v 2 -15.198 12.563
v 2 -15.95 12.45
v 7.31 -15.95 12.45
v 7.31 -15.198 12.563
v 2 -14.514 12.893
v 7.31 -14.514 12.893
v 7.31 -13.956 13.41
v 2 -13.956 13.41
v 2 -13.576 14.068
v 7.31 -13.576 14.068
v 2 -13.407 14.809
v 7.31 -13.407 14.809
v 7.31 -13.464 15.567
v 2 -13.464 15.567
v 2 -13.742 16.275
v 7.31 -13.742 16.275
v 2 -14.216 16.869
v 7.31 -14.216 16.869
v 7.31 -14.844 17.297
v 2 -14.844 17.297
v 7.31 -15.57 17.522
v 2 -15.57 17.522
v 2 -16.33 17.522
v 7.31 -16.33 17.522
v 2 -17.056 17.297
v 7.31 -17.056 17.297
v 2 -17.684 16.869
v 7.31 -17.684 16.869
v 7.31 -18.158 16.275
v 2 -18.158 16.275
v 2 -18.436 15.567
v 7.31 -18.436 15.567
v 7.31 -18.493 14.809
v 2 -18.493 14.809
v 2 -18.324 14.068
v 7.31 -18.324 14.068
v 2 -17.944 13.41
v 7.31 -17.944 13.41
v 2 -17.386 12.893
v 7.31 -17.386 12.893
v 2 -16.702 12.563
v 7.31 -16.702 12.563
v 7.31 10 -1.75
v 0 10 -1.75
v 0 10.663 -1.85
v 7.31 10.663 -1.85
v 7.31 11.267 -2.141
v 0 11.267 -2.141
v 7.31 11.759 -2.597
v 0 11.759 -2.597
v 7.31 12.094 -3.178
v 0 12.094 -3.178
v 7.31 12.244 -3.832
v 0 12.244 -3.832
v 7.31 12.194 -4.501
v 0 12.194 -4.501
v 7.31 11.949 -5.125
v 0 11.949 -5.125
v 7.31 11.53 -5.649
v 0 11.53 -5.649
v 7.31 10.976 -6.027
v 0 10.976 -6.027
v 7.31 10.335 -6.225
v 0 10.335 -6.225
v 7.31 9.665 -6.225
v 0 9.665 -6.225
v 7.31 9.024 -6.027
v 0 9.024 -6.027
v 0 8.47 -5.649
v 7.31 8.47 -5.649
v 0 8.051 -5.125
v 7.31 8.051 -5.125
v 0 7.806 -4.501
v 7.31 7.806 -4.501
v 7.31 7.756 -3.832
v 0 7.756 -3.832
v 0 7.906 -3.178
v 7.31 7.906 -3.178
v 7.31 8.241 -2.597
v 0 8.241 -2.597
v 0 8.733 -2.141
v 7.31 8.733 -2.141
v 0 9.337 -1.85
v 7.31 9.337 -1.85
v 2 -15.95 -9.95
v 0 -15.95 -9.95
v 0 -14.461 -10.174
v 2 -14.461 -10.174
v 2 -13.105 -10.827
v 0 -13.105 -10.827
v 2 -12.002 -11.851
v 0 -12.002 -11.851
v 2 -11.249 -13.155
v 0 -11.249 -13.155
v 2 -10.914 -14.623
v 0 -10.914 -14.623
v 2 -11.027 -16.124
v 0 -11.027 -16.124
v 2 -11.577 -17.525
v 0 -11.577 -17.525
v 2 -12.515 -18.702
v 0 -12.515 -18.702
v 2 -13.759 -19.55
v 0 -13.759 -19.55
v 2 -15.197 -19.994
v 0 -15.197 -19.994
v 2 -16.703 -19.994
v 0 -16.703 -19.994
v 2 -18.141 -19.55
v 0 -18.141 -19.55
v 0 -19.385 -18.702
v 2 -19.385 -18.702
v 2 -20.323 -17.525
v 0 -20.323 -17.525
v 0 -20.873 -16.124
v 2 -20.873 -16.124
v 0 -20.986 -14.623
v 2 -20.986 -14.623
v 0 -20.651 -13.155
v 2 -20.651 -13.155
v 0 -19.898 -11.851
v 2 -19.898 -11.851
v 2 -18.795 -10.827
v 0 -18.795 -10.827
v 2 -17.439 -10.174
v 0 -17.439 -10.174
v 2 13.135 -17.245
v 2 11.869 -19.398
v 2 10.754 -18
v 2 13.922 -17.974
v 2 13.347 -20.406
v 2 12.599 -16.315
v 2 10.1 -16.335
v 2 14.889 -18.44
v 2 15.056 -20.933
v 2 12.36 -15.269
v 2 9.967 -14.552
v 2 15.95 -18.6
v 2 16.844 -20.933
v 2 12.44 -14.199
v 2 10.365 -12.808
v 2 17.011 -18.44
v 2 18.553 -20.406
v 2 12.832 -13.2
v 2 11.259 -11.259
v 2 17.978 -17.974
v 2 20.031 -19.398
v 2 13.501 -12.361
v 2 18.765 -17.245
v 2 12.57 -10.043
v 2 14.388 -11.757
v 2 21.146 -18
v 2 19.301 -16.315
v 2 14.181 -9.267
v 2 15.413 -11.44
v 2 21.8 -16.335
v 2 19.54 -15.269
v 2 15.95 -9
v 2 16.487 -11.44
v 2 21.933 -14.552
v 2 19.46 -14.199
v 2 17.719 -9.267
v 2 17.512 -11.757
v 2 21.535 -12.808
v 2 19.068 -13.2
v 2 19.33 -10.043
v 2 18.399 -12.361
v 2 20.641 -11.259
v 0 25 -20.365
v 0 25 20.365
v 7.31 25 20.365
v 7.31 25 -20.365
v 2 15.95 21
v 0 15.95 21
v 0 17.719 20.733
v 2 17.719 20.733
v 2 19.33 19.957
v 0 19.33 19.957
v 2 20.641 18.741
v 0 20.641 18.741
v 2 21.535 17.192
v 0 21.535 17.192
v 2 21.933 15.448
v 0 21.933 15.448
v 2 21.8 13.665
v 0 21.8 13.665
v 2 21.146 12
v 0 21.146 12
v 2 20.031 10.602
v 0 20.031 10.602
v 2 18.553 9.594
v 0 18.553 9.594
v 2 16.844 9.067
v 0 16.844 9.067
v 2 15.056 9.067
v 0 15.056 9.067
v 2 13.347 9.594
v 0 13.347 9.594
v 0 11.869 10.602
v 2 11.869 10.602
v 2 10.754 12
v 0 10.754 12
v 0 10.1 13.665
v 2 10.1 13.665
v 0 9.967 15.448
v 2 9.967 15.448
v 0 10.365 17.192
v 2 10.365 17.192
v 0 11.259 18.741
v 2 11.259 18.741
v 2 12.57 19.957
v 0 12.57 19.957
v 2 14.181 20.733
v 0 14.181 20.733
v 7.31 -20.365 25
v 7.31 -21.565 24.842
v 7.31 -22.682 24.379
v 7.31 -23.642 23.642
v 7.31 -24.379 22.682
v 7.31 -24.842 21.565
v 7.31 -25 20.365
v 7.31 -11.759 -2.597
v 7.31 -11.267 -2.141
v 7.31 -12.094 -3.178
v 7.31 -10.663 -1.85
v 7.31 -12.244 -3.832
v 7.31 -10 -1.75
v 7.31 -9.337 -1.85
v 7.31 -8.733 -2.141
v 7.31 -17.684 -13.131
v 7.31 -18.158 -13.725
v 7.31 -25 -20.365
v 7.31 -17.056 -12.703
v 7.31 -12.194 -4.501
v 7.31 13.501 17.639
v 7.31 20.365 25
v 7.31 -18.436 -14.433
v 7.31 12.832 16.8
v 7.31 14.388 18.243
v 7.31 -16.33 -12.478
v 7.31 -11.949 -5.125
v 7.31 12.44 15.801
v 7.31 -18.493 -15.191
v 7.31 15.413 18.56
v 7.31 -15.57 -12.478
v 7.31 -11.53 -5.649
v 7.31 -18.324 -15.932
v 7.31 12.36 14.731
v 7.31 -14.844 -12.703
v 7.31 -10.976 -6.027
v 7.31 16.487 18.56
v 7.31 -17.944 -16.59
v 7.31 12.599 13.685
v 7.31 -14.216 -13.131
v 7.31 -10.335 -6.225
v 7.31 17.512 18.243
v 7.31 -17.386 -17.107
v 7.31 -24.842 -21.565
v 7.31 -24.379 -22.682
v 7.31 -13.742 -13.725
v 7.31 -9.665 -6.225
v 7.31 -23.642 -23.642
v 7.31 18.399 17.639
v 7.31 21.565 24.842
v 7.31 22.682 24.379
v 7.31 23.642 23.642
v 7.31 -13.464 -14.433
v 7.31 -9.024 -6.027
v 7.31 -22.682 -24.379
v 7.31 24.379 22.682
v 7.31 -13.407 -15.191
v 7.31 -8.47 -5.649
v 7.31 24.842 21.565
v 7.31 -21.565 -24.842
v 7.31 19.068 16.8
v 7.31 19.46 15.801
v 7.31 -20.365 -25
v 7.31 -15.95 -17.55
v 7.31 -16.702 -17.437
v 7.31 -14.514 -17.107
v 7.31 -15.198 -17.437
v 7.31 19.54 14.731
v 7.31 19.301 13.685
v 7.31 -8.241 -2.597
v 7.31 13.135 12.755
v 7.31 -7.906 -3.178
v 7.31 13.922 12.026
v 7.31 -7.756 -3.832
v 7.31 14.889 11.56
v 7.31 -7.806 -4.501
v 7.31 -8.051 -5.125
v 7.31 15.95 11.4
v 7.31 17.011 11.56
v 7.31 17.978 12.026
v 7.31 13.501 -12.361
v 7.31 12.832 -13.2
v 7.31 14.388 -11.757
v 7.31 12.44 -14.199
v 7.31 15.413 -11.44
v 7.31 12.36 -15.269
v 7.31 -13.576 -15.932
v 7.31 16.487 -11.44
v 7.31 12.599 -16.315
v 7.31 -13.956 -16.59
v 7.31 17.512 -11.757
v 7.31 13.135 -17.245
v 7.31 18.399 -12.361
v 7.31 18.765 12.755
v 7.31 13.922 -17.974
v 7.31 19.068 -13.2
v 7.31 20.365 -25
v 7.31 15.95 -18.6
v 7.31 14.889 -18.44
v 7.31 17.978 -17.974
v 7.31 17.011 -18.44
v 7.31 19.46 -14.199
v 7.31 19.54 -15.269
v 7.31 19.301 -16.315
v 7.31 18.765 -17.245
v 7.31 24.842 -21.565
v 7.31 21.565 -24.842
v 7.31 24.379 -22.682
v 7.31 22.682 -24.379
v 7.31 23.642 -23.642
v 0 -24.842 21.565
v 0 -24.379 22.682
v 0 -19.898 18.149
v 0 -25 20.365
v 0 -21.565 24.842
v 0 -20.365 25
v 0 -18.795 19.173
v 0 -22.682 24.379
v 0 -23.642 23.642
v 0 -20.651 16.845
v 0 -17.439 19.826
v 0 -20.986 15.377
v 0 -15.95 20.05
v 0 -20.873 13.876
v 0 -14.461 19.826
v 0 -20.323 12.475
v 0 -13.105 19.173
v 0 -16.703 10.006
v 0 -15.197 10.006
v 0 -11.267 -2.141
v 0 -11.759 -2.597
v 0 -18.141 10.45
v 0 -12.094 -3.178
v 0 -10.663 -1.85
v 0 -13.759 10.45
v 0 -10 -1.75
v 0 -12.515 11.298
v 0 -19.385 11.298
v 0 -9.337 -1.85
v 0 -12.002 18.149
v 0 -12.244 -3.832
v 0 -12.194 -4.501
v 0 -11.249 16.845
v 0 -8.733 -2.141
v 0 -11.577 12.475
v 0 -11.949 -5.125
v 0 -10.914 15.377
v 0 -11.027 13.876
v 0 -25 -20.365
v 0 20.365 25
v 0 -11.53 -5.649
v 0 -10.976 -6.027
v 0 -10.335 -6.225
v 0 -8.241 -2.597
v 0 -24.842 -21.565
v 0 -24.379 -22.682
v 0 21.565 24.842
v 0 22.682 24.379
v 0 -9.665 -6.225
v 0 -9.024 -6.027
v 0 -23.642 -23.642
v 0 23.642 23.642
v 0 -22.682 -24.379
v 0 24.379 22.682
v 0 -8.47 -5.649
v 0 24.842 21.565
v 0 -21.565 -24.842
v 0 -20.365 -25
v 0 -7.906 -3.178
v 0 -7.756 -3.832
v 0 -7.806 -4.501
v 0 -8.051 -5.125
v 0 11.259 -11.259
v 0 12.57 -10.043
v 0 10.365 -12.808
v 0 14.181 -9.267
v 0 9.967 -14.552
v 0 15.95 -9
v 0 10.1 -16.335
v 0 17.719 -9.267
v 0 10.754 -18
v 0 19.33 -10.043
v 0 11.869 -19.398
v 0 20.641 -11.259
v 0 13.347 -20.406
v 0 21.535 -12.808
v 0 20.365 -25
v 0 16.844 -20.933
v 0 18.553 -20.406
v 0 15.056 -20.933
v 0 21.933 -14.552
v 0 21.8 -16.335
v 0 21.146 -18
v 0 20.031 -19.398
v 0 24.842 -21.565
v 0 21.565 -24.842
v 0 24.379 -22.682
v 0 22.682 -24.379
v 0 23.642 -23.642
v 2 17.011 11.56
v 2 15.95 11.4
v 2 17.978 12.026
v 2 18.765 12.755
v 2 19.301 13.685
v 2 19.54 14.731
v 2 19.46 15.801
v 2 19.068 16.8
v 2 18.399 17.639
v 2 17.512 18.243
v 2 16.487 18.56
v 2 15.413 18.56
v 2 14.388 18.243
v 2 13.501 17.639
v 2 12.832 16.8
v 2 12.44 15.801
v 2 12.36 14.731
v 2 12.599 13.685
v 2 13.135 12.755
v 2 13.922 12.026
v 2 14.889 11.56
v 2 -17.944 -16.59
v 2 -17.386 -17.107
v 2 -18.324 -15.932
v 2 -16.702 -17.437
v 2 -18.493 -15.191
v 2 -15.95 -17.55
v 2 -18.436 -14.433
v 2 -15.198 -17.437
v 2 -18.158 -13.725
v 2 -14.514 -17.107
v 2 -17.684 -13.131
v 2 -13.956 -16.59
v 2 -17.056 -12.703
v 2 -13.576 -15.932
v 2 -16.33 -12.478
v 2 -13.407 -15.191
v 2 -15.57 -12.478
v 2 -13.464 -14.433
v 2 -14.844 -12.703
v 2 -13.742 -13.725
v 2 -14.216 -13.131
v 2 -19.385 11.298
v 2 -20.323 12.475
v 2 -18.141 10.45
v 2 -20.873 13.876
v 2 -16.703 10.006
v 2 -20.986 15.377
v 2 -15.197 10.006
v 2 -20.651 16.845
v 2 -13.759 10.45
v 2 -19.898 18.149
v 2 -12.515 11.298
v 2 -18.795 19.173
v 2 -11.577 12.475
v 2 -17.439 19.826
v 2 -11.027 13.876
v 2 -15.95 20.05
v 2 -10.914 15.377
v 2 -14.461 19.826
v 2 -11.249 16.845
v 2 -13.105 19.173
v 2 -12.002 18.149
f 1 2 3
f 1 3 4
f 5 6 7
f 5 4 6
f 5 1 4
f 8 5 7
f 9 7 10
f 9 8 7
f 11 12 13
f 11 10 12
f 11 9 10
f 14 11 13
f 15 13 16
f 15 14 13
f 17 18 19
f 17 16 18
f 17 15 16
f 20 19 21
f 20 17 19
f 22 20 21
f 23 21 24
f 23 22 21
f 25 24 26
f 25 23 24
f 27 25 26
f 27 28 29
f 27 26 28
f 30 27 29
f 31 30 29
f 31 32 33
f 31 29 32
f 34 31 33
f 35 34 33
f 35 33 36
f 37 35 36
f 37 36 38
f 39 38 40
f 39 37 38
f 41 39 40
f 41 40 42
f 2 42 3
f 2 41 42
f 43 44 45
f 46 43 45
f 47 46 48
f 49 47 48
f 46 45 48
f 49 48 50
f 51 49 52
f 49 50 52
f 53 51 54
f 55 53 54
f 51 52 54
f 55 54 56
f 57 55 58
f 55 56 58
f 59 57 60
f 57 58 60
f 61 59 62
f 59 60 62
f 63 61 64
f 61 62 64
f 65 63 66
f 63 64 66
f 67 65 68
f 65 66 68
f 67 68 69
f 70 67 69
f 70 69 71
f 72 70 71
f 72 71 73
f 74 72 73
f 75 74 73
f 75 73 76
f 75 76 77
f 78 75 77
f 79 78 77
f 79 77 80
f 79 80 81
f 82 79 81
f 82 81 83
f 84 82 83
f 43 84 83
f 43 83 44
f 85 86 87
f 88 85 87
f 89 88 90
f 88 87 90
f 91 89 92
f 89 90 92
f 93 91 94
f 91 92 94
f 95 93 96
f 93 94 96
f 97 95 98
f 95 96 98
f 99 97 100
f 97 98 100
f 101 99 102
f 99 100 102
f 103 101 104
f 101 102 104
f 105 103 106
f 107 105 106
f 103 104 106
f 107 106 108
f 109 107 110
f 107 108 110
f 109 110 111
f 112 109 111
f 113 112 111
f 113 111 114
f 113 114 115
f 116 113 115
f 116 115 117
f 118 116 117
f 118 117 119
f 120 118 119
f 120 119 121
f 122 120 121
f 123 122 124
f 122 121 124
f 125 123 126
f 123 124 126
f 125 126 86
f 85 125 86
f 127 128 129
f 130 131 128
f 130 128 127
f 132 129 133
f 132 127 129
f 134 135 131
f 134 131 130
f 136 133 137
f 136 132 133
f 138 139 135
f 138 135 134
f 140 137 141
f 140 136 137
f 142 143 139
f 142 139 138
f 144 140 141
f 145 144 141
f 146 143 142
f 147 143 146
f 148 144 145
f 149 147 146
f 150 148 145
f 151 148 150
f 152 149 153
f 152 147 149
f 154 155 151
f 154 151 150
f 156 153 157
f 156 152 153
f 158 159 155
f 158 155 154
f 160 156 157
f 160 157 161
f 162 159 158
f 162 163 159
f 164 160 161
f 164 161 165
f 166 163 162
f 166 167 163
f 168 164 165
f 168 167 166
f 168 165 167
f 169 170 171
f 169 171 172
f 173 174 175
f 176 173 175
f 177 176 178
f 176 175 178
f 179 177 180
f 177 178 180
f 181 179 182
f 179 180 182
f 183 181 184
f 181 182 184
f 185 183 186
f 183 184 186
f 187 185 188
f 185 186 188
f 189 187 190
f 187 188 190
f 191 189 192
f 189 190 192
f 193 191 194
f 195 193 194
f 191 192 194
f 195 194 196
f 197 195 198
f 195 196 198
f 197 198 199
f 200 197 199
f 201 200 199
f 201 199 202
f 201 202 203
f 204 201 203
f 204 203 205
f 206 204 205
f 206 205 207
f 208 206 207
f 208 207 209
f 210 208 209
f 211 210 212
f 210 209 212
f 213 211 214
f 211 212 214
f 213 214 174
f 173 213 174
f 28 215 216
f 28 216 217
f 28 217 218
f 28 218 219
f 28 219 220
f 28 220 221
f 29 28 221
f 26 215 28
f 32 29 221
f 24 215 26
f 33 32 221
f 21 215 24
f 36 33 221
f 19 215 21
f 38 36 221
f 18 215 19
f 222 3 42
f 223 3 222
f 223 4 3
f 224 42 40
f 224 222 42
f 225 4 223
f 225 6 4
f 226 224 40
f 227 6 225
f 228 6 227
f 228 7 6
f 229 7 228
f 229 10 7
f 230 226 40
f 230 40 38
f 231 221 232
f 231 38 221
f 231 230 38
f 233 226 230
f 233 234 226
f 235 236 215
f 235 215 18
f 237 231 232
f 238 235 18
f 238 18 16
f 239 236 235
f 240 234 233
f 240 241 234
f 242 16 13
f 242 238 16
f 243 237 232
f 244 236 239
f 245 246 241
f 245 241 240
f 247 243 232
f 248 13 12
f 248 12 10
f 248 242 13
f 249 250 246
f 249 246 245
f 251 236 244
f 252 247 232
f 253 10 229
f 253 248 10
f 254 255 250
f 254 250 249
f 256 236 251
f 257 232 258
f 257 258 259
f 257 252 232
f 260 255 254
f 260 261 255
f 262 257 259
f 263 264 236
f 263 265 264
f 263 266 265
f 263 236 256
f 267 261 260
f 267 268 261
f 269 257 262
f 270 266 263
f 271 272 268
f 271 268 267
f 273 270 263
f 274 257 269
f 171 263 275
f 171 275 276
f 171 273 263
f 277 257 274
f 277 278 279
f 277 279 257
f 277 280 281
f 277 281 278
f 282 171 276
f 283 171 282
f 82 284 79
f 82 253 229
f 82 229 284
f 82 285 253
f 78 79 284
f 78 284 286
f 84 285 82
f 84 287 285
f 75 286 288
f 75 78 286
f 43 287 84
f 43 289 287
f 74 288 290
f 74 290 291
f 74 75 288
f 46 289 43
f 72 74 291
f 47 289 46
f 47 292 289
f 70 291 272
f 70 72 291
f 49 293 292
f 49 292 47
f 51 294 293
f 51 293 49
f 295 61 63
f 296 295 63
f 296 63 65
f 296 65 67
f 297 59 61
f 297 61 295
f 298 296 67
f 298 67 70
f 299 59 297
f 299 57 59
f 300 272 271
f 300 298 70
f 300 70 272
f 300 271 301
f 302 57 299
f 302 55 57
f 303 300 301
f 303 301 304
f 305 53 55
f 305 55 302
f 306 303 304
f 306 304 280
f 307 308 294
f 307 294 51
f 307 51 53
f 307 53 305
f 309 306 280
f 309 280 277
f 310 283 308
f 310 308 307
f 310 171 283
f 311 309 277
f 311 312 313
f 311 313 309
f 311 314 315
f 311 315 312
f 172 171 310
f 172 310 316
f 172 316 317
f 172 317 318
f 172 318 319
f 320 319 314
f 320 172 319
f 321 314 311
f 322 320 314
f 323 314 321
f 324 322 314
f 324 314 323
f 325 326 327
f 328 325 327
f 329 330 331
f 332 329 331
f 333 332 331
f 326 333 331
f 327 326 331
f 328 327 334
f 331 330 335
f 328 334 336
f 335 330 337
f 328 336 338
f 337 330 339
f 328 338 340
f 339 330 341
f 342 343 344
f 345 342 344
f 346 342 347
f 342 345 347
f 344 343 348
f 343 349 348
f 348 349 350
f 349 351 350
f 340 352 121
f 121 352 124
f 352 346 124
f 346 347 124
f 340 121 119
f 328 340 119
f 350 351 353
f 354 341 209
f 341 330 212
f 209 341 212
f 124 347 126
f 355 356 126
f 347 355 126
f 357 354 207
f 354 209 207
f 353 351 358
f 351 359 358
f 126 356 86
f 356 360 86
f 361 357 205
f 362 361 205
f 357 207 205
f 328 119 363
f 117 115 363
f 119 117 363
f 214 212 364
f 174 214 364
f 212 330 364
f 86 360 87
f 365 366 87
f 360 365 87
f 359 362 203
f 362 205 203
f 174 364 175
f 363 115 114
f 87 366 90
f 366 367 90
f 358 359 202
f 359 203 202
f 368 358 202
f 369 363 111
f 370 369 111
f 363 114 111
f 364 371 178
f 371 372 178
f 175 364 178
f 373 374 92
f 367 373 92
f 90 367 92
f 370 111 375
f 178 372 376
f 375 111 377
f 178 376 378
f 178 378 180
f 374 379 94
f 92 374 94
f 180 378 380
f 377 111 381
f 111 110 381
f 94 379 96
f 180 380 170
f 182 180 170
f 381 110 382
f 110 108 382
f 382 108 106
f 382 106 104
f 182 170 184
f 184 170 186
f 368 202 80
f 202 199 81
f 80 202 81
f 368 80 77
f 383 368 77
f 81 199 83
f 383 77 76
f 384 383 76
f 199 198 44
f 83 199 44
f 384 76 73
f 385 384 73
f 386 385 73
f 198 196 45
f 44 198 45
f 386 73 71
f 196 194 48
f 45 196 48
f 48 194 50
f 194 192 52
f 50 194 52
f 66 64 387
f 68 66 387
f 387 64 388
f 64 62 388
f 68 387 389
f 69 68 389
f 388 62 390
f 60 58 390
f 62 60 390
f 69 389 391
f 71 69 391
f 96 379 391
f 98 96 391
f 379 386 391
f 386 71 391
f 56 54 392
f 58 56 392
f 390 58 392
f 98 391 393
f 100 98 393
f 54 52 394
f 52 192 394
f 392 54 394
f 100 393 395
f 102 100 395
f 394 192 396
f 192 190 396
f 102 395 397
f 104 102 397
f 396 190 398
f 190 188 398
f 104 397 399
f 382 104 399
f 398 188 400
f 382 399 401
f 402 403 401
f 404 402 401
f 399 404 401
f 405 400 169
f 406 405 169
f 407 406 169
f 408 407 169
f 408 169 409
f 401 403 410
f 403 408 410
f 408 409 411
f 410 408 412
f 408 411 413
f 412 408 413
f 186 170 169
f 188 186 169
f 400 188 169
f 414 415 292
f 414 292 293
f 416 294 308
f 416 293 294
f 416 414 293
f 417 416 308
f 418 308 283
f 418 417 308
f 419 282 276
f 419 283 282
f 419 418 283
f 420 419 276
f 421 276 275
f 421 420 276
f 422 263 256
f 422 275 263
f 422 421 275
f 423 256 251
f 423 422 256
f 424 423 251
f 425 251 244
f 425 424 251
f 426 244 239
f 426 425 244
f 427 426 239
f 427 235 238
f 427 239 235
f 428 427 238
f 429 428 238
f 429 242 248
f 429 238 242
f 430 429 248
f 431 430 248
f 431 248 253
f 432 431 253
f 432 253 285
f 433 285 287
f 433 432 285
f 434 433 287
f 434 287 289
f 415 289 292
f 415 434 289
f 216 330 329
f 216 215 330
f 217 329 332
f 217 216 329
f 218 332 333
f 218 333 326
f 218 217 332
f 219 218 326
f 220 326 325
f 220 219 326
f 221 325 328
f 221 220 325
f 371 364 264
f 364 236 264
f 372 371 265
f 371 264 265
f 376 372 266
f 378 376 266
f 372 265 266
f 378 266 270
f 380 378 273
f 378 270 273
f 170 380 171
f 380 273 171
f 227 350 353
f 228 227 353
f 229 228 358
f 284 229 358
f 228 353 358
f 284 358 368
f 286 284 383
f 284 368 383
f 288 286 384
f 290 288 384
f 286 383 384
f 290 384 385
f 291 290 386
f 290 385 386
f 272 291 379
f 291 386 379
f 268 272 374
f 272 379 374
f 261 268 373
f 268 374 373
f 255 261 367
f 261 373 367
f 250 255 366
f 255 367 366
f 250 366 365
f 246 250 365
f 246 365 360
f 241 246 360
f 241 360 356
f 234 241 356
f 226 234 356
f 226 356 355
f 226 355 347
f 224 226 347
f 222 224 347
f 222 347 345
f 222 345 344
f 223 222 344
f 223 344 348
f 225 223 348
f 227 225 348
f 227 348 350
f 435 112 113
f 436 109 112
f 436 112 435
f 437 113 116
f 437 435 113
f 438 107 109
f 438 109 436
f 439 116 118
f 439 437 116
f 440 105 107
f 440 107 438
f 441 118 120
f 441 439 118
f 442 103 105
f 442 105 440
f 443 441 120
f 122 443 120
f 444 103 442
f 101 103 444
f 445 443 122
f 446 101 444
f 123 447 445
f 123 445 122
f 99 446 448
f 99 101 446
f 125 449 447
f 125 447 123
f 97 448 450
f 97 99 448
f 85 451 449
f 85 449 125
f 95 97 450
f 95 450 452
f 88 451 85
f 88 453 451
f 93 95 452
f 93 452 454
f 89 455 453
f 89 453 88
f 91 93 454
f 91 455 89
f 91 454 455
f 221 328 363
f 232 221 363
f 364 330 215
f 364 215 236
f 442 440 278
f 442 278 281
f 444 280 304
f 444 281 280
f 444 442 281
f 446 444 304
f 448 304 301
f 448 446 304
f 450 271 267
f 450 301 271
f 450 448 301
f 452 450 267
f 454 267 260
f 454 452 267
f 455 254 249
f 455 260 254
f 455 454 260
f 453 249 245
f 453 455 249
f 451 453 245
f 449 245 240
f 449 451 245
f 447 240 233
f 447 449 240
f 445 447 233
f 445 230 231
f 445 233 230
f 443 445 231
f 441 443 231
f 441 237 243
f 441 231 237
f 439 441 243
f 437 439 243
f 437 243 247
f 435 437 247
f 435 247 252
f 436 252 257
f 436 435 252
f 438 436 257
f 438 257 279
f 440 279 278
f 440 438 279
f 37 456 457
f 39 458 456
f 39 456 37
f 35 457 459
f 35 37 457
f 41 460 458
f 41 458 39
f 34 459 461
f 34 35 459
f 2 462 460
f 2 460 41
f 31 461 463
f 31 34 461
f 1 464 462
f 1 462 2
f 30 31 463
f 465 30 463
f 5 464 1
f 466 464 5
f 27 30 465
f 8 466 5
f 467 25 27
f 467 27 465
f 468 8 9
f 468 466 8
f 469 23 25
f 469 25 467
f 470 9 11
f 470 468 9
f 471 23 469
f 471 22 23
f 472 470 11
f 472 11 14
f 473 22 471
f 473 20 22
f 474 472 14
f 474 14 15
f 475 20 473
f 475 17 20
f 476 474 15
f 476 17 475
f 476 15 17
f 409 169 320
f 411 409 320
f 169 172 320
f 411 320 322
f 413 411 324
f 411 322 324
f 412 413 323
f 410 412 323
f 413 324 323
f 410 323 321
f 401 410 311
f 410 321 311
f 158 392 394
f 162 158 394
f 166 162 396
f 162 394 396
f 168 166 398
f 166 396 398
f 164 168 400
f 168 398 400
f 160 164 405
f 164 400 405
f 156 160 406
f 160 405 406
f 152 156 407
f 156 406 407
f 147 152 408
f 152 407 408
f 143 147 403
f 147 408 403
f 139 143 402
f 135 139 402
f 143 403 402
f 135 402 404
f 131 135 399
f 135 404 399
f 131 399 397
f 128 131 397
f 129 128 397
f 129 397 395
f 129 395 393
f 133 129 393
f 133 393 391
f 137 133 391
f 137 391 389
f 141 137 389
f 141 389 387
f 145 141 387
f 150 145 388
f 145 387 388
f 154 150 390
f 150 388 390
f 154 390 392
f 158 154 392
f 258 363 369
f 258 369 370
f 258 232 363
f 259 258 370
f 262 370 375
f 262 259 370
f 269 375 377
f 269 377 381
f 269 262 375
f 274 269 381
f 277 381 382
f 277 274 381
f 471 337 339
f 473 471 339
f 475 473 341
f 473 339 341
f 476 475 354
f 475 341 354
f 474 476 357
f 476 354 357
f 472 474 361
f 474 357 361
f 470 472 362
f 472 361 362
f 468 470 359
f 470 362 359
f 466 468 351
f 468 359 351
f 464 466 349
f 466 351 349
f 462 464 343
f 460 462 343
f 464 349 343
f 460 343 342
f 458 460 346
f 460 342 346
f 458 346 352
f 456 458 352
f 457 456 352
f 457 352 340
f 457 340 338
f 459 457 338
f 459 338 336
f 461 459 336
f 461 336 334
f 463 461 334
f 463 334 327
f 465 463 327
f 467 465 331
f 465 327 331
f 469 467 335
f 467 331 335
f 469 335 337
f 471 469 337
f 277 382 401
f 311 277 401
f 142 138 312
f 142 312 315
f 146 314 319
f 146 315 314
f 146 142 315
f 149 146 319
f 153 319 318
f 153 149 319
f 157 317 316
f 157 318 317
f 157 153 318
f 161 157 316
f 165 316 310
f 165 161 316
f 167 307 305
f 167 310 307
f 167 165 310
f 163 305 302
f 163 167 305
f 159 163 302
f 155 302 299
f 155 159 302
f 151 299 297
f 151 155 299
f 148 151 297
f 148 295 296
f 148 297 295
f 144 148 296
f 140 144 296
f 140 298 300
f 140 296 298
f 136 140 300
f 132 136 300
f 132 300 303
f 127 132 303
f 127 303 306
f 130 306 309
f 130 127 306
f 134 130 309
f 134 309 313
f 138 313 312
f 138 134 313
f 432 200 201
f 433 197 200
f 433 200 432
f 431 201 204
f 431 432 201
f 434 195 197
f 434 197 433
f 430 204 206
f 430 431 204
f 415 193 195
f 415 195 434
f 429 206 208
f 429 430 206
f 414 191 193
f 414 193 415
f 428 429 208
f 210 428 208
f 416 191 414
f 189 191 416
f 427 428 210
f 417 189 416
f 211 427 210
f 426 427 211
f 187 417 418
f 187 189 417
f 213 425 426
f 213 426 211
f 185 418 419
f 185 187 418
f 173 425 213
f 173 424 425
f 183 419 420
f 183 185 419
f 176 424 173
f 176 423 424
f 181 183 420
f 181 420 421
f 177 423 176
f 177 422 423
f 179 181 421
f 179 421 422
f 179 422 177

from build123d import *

# Parameters (mm, degrees)
SKETCH2_W            = 50
SKETCH2_H            = 50
BOSS_EXTRUDE1_DEPTH  = 7.31
SKETCH6_R            = 3.6
SKETCH6_R_2          = 2.55
CUT_EXTRUDE2_DEPTH   = 8.31
SKETCH7_R            = 5.05
SKETCH7_R_2          = 6
CUT_EXTRUDE3_DEPTH   = 2
M4_CLEARANCE_HOLE1_D = 4.5
FILLET1_R            = 4.635


with BuildPart() as part:
    # Sketch2 → Boss-Extrude1 (new body)
    with BuildSketch(Plane(origin=(0, 0, 0), x_dir=(0, 0, -1), z_dir=(1, 0, 0))):
        Rectangle(SKETCH2_W, SKETCH2_H)
    extrude(amount=BOSS_EXTRUDE1_DEPTH)

    # Sketch6 → Cut-Extrude2 (cut, through all)
    with BuildSketch(Plane(origin=(0, 0, 0), x_dir=(0, 0, -1), z_dir=(1, 0, 0))):
        with Locations((-15, 15.95)):
            Circle(SKETCH6_R)
        with Locations((15, 15.95)):
            Circle(SKETCH6_R)
        with Locations((-15, -15.95)):
            Circle(SKETCH6_R_2)
        with Locations((15, -15.95)):
            Circle(SKETCH6_R_2)
    extrude(amount=CUT_EXTRUDE2_DEPTH, mode=Mode.SUBTRACT)

    # Sketch7 → Cut-Extrude3 (cut)
    with BuildSketch(Plane.ZY):
        with Locations((-15, -15.95)):
            Circle(SKETCH7_R)
        with Locations((15, -15.95)):
            Circle(SKETCH7_R)
        with Locations((-15, 15.95)):
            Circle(SKETCH7_R_2)
        with Locations((15, 15.95)):
            Circle(SKETCH7_R_2)
    extrude(amount=-CUT_EXTRUDE3_DEPTH, mode=Mode.SUBTRACT)

    # M4 Clearance Hole1 (through all)
    with Locations(Plane(origin=(7.31, 0, 0), x_dir=(0, 0, -1), z_dir=(1, 0, 0))):
        with Locations((4, -10), (4, 10)):
            Hole(M4_CLEARANCE_HOLE1_D / 2)

    # Fillet1
    fillet1_edges = [part.edges().sort_by_distance(p)[0] for p in [
        (3.655, -25, -25),
        (3.655, -25, 25),
        (3.655, 25, 25),
        (3.655, 25, -25),
    ]]
    fillet(fillet1_edges, radius=FILLET1_R)


solid = part.part
